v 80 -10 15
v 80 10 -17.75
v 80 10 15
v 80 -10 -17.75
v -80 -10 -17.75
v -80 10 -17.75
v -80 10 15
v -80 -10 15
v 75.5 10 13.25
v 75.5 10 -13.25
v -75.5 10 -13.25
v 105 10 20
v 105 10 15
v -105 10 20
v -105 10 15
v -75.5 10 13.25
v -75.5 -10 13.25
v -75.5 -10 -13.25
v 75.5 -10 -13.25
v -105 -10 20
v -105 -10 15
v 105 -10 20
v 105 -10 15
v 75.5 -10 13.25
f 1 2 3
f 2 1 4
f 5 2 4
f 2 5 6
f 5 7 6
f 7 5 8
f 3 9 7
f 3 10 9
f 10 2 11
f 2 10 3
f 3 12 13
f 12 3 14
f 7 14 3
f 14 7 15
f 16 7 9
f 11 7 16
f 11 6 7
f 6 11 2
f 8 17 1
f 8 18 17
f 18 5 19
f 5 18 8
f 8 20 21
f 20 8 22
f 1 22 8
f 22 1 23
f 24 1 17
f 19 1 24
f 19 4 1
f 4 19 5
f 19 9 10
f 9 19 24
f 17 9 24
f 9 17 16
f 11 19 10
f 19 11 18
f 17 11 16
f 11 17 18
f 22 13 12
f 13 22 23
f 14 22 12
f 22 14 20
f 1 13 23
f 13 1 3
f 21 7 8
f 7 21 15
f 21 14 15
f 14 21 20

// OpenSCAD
// Mount for MOKIN USB C Docking Station Triple Display (Macbook M1) 13in1
// https://www.amazon.de/gp/product/B09YXKYR2V

// Print two of them and screw them under a table...

union() {
    translate([-105, -10, 15])
    cube([210, 20, 5]);
    difference() {
        cube([160, 20, 35.5], true);
        cube([151, 20, 26.5], true) ;
    }
}
